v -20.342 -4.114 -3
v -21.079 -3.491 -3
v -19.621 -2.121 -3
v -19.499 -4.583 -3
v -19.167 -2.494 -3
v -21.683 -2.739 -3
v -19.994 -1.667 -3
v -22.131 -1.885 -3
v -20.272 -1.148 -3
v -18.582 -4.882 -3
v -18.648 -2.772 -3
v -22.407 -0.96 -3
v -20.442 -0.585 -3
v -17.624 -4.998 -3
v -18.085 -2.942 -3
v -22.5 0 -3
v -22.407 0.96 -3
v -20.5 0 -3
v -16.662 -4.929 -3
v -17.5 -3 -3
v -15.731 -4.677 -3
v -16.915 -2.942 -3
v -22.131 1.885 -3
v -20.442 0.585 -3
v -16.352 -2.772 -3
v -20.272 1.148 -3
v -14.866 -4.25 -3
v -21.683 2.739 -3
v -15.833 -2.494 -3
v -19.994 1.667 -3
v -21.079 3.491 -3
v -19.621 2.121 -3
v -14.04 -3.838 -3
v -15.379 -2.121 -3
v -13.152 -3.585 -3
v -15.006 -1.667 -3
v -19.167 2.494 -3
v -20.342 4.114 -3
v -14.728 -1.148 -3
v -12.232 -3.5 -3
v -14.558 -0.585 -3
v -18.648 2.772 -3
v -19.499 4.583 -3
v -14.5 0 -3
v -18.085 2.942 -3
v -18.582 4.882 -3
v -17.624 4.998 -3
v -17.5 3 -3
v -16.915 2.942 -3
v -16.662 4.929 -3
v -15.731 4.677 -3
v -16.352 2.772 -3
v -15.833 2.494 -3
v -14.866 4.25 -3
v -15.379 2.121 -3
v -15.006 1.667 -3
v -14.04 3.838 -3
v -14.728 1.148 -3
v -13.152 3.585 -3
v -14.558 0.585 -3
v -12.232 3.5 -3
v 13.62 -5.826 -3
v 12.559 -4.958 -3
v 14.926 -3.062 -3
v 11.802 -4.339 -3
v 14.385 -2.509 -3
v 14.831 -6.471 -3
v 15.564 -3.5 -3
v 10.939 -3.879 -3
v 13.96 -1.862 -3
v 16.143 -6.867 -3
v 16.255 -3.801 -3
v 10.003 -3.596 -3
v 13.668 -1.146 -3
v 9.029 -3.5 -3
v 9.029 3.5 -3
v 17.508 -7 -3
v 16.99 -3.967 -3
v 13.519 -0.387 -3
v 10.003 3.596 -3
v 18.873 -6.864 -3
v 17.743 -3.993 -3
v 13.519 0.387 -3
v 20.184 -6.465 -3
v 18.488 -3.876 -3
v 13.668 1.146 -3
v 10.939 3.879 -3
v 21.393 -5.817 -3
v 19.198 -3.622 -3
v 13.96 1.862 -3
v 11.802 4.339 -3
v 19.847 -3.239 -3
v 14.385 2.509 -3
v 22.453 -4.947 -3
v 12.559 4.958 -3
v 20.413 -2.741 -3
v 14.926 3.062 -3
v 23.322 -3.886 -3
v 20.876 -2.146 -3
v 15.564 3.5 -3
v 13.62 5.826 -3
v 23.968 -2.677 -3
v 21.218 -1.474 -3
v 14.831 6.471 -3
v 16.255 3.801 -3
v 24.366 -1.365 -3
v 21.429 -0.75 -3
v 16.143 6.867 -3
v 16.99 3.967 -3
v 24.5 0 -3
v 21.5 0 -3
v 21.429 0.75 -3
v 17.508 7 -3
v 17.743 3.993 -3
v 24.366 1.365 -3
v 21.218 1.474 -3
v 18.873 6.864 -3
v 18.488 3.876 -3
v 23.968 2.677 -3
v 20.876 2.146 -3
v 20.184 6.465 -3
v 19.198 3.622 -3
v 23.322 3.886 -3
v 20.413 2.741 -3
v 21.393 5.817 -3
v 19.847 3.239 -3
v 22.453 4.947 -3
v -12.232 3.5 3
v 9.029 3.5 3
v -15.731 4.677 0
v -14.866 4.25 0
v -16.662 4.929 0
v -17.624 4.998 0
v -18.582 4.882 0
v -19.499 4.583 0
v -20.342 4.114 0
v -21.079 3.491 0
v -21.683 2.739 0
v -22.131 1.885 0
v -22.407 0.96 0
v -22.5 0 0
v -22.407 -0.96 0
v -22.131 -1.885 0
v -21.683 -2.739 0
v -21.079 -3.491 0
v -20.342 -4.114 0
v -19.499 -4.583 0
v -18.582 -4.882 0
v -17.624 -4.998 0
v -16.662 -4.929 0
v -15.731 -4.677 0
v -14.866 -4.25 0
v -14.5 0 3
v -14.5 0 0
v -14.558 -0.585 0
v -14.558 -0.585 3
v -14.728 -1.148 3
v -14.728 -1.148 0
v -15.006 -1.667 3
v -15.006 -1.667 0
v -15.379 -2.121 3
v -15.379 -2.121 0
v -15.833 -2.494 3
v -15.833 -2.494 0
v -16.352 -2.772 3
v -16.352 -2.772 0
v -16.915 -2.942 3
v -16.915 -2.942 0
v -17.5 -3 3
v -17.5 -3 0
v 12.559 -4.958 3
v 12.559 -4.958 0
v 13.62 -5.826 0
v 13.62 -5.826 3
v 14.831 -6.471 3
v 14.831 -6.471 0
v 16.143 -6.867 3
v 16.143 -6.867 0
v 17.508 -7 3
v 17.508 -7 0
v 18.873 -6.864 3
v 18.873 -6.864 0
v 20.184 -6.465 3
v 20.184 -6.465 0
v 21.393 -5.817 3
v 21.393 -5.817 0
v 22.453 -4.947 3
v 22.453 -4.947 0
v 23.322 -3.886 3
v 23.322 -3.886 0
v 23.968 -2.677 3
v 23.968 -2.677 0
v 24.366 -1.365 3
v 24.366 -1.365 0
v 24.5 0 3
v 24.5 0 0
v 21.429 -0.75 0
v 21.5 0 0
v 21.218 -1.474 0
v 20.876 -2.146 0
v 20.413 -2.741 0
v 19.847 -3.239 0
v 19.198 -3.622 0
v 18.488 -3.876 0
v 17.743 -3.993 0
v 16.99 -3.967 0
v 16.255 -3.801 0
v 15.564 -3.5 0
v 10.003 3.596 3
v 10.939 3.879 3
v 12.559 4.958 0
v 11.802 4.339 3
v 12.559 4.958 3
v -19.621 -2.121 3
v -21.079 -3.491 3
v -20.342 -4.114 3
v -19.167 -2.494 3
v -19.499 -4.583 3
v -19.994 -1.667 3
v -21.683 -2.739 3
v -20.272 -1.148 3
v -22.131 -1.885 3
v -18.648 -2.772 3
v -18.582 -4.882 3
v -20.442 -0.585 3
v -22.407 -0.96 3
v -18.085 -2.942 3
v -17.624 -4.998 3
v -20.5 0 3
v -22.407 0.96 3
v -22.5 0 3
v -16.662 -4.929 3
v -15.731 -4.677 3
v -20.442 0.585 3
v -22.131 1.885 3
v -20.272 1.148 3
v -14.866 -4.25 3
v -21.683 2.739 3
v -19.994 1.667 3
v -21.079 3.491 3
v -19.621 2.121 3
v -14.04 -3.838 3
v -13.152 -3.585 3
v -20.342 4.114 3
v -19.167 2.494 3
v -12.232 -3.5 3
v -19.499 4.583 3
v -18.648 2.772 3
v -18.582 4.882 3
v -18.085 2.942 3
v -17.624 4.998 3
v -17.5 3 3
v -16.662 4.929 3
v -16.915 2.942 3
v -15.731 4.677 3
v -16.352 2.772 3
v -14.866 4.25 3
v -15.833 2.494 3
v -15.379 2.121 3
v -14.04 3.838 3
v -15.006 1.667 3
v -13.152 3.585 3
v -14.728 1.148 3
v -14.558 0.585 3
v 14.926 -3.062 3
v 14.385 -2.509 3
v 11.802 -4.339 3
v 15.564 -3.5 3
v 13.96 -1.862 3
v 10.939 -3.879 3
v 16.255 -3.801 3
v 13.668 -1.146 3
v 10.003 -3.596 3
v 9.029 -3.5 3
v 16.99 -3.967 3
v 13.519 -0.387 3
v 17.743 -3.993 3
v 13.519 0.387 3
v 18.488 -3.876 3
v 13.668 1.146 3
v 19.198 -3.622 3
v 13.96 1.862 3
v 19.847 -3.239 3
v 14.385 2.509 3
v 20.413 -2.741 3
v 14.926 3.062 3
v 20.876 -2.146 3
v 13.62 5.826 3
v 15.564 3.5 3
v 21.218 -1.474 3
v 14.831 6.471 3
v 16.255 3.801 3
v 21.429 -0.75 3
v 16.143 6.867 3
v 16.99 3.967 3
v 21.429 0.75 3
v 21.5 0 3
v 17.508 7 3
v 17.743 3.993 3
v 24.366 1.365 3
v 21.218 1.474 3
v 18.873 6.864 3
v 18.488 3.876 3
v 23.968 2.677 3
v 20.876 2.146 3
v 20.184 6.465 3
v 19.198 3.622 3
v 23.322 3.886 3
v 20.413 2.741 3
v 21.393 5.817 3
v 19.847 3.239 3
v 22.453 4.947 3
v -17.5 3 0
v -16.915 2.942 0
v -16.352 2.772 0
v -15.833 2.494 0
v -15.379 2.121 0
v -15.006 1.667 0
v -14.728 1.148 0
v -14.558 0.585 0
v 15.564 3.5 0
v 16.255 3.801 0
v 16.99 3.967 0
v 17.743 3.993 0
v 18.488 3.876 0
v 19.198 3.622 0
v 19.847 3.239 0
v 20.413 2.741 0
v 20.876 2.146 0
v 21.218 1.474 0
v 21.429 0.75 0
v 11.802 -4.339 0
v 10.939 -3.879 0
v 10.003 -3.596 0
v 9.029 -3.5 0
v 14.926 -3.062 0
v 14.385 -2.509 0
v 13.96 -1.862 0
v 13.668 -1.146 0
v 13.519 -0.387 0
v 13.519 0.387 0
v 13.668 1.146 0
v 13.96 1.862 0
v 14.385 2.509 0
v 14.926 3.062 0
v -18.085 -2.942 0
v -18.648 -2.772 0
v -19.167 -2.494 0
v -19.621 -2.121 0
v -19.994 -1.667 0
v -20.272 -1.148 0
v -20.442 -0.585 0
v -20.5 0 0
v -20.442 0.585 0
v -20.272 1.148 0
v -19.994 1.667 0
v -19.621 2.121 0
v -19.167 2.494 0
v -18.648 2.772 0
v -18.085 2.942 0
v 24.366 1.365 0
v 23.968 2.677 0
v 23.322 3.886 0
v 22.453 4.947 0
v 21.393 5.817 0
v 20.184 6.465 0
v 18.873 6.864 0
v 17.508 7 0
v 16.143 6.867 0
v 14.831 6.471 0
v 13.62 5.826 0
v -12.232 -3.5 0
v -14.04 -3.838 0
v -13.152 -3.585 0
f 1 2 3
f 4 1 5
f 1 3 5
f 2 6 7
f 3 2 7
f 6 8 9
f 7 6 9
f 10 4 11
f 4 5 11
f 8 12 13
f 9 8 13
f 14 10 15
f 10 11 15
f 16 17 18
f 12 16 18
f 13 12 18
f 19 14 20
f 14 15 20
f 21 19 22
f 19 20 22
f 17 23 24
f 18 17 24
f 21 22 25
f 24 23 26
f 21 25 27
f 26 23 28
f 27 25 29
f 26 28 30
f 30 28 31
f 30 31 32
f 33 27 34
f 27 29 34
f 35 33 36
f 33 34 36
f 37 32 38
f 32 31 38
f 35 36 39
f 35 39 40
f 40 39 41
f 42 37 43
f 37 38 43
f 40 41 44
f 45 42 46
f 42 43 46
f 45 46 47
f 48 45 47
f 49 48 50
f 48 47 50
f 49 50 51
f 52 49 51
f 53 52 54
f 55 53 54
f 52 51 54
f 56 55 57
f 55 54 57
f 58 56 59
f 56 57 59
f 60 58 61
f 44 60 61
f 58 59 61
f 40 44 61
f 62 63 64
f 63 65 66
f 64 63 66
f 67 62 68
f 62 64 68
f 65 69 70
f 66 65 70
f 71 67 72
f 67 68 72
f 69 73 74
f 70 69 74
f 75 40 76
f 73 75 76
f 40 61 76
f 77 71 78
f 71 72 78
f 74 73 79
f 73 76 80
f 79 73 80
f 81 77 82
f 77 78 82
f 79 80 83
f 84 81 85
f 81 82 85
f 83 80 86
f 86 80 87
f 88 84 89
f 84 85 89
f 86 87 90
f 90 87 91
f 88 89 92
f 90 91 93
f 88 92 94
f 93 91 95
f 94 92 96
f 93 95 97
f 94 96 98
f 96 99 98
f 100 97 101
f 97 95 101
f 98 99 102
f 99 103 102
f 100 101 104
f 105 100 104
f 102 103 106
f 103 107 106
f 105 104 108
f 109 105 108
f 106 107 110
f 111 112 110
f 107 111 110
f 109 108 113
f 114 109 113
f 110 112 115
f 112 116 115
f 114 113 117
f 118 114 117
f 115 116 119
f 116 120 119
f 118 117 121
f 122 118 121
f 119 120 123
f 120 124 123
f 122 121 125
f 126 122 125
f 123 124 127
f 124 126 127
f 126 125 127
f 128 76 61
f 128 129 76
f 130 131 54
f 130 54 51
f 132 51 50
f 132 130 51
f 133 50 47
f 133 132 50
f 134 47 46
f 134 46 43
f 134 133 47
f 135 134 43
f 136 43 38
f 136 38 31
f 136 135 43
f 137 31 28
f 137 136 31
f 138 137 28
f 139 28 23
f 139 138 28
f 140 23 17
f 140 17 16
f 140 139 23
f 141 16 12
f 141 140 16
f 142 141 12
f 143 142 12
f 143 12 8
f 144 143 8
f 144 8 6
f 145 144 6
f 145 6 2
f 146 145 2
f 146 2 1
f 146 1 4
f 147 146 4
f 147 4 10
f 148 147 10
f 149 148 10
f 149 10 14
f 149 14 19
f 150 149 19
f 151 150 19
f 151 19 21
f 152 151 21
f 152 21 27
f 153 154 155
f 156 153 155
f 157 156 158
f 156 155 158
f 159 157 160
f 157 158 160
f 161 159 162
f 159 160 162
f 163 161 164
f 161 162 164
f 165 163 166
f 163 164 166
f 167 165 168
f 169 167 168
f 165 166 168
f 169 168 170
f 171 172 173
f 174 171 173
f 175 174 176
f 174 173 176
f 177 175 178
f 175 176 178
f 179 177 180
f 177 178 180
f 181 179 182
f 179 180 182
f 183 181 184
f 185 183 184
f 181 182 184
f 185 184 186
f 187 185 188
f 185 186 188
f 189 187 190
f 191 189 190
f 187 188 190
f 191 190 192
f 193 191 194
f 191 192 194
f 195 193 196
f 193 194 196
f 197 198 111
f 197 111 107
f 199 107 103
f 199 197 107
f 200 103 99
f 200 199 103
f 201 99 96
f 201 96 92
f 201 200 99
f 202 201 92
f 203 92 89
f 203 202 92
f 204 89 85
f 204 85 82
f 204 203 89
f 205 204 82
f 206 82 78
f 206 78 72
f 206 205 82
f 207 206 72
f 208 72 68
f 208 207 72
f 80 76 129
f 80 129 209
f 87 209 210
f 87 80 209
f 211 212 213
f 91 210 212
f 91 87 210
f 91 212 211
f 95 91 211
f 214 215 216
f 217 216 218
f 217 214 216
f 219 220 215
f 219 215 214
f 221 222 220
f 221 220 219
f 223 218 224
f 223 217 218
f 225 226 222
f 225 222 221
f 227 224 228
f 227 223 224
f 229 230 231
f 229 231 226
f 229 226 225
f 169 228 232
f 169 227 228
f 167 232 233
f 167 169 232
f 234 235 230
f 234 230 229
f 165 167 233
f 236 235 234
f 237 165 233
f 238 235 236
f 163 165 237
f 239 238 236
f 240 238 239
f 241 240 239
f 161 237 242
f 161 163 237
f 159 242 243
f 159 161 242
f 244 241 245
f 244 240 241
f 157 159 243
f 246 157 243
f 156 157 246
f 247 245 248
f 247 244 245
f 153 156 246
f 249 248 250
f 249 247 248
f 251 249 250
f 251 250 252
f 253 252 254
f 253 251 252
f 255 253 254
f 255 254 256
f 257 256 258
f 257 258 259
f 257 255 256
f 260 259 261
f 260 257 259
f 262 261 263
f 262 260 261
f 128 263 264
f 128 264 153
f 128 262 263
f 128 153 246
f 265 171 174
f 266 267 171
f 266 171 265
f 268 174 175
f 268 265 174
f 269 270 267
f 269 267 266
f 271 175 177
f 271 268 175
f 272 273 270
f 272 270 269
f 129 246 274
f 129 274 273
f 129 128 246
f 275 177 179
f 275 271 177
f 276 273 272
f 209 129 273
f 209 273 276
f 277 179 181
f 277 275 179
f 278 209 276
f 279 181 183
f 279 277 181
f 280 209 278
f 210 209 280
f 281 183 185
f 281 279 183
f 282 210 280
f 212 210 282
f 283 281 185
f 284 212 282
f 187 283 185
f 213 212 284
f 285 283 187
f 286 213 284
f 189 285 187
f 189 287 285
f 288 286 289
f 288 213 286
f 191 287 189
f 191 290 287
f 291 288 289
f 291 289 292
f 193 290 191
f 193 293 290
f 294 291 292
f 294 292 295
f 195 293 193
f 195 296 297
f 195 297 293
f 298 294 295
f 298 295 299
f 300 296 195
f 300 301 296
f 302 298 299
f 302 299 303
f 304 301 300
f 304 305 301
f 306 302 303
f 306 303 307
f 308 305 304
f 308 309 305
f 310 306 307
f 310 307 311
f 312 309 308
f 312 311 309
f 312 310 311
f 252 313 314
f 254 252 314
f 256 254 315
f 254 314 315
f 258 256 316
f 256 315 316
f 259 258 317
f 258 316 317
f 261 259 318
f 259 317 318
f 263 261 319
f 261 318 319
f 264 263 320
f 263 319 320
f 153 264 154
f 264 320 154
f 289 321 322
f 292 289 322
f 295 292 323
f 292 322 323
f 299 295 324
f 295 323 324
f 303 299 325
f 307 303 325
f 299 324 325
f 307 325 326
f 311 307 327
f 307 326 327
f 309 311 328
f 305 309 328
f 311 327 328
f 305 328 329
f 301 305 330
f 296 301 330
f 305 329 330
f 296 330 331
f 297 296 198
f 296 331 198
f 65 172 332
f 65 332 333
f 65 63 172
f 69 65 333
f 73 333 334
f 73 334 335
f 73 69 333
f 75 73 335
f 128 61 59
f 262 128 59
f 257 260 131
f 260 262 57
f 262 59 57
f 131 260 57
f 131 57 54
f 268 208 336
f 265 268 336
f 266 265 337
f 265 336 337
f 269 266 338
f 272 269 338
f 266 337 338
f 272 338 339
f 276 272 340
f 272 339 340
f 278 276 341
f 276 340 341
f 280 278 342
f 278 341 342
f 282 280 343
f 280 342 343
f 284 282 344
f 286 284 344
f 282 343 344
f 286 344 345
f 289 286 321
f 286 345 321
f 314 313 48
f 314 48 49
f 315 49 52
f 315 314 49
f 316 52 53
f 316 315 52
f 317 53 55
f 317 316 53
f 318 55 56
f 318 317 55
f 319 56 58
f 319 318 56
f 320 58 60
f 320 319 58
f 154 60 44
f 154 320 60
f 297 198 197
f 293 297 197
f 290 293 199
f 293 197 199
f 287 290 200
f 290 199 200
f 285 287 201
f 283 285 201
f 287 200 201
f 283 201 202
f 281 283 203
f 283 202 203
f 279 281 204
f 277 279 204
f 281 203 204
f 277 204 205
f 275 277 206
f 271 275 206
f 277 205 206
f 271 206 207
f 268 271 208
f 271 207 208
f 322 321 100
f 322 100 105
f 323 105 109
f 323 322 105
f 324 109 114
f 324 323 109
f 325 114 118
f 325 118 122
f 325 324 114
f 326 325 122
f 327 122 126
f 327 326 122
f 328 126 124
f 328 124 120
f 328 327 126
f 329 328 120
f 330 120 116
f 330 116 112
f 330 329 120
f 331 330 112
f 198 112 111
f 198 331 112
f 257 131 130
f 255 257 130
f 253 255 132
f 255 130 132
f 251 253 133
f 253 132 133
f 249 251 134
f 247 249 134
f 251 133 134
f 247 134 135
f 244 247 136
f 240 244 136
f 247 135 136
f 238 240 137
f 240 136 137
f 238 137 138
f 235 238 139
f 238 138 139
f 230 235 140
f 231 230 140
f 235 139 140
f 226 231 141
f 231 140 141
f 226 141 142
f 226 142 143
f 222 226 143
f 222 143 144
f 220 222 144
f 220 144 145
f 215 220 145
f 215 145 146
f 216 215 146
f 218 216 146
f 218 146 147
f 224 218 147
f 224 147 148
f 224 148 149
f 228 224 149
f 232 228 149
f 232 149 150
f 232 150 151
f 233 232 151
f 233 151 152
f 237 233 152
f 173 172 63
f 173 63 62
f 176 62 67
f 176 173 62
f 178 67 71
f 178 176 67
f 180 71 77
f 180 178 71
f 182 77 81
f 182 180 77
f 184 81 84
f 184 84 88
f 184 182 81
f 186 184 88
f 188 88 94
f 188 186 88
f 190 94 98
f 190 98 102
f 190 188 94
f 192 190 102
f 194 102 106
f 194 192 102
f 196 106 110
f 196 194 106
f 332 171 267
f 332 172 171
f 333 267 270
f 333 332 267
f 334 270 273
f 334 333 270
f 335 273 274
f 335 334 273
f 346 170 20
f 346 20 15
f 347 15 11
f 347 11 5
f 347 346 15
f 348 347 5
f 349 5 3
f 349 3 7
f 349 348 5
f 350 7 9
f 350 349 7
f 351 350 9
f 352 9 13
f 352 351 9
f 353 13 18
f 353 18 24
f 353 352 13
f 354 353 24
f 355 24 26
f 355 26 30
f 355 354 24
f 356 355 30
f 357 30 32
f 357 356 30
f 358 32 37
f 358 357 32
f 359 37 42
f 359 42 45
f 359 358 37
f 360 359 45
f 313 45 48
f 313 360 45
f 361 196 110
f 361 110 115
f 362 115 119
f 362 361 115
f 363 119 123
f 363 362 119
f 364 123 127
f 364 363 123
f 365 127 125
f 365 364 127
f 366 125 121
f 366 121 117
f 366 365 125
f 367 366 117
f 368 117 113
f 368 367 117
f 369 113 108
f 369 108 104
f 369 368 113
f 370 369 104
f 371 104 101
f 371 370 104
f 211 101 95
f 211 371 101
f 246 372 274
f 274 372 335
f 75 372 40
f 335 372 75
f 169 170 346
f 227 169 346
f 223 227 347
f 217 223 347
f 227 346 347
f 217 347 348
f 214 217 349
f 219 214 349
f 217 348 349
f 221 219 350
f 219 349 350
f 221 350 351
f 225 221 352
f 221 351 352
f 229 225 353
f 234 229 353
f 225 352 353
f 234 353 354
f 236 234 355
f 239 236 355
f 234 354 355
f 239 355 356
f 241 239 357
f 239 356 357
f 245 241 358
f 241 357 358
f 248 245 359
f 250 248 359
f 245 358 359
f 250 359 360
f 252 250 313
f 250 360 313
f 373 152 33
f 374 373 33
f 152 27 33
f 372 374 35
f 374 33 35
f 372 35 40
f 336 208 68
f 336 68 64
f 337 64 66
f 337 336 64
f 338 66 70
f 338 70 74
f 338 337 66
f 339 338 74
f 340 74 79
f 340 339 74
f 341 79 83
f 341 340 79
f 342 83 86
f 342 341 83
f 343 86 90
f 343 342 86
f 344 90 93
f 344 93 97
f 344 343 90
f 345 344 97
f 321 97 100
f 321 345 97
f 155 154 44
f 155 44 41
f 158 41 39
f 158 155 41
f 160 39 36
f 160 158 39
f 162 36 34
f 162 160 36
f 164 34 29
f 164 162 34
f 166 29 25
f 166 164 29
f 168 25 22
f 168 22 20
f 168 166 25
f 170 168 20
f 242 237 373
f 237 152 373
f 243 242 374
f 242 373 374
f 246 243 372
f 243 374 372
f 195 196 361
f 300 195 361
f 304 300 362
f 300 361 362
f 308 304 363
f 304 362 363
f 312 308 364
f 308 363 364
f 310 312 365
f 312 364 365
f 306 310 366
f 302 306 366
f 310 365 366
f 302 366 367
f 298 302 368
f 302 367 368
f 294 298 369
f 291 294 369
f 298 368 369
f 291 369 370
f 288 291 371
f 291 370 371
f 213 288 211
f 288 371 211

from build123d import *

# Parameters (mm, degrees)
BOSS_EXTRUDE1_DEPTH = 3
FILLET1_R           = 5


with BuildPart() as part:
    # Sketch3 → Boss-Extrude1 (new, symmetric)
    with BuildSketch(Plane.XY):
        with BuildLine():
            Line((11.437822174, 3.5), (-13.929285786, 3.5))
            ThreePointArc((-13.929285786, 3.5), (-12.871092404, 1.890294809), (-12.5, 0))
            ThreePointArc((-12.5, 0), (-12.871092404, -1.890294809), (-13.929285786, -3.5))
            Line((-13.929285786, -3.5), (11.437822174, -3.5))
            ThreePointArc((11.437822174, -3.5), (10.5, 0), (11.437822174, 3.5))
        make_face()
        with BuildLine():
            Line((-17.5, 3), (-17.5, 3.5))
            Line((-17.5, 3.5), (-13.929285786, 3.5))
            ThreePointArc((-13.929285786, 3.5), (-22.5, 0), (-13.929285786, -3.5))
            Line((-13.929285786, -3.5), (-17.5, -3.5))
            Line((-17.5, -3.5), (-17.5, -3))
            ThreePointArc((-17.5, -3), (-20.5, 0), (-17.5, 3))
        make_face()
        with BuildLine():
            Line((-13.929285786, 3.5), (-17.5, 3.5))
            Line((-17.5, 3.5), (-17.5, 3))
            ThreePointArc((-17.5, 3), (-15.378679656, 2.121320344), (-14.5, 0))
            ThreePointArc((-14.5, 0), (-15.378679656, -2.121320344), (-17.5, -3))
            Line((-17.5, -3), (-17.5, -3.5))
            Line((-17.5, -3.5), (-13.929285786, -3.5))
            ThreePointArc((-13.929285786, -3.5), (-12.871092404, -1.890294809), (-12.5, 0))
            ThreePointArc((-12.5, 0), (-12.871092404, 1.890294809), (-13.929285786, 3.5))
        make_face()
        with BuildLine():
            ThreePointArc((24.5, 0), (19.311733316, 6.761480784), (11.437822174, 3.5))
            Line((11.437822174, 3.5), (15.563508327, 3.5))
            ThreePointArc((15.563508327, 3.5), (19.531506006, 3.445719569), (21.5, 0))
            ThreePointArc((21.5, 0), (19.531506006, -3.445719569), (15.563508327, -3.5))
            Line((15.563508327, -3.5), (11.437822174, -3.5))
            ThreePointArc((11.437822174, -3.5), (19.311733316, -6.761480784), (24.5, 0))
        make_face()
        with BuildLine():
            Line((15.563508327, 3.5), (11.437822174, 3.5))
            ThreePointArc((11.437822174, 3.5), (10.5, 0), (11.437822174, -3.5))
            Line((11.437822174, -3.5), (15.563508327, -3.5))
            ThreePointArc((15.563508327, -3.5), (13.5, 0), (15.563508327, 3.5))
        make_face()
    extrude(amount=BOSS_EXTRUDE1_DEPTH, both=True)

    # Fillet1
    fillet1_edges = [part.edges().sort_by_distance(p)[0] for p in [
        (-13.929285786, 3.5, 0),
        (11.437822174, 3.5, 0),
        (11.437822174, -3.5, 0),
        (-13.929285786, -3.5, 0),
    ]]
    fillet(fillet1_edges, radius=FILLET1_R)


solid = part.part
